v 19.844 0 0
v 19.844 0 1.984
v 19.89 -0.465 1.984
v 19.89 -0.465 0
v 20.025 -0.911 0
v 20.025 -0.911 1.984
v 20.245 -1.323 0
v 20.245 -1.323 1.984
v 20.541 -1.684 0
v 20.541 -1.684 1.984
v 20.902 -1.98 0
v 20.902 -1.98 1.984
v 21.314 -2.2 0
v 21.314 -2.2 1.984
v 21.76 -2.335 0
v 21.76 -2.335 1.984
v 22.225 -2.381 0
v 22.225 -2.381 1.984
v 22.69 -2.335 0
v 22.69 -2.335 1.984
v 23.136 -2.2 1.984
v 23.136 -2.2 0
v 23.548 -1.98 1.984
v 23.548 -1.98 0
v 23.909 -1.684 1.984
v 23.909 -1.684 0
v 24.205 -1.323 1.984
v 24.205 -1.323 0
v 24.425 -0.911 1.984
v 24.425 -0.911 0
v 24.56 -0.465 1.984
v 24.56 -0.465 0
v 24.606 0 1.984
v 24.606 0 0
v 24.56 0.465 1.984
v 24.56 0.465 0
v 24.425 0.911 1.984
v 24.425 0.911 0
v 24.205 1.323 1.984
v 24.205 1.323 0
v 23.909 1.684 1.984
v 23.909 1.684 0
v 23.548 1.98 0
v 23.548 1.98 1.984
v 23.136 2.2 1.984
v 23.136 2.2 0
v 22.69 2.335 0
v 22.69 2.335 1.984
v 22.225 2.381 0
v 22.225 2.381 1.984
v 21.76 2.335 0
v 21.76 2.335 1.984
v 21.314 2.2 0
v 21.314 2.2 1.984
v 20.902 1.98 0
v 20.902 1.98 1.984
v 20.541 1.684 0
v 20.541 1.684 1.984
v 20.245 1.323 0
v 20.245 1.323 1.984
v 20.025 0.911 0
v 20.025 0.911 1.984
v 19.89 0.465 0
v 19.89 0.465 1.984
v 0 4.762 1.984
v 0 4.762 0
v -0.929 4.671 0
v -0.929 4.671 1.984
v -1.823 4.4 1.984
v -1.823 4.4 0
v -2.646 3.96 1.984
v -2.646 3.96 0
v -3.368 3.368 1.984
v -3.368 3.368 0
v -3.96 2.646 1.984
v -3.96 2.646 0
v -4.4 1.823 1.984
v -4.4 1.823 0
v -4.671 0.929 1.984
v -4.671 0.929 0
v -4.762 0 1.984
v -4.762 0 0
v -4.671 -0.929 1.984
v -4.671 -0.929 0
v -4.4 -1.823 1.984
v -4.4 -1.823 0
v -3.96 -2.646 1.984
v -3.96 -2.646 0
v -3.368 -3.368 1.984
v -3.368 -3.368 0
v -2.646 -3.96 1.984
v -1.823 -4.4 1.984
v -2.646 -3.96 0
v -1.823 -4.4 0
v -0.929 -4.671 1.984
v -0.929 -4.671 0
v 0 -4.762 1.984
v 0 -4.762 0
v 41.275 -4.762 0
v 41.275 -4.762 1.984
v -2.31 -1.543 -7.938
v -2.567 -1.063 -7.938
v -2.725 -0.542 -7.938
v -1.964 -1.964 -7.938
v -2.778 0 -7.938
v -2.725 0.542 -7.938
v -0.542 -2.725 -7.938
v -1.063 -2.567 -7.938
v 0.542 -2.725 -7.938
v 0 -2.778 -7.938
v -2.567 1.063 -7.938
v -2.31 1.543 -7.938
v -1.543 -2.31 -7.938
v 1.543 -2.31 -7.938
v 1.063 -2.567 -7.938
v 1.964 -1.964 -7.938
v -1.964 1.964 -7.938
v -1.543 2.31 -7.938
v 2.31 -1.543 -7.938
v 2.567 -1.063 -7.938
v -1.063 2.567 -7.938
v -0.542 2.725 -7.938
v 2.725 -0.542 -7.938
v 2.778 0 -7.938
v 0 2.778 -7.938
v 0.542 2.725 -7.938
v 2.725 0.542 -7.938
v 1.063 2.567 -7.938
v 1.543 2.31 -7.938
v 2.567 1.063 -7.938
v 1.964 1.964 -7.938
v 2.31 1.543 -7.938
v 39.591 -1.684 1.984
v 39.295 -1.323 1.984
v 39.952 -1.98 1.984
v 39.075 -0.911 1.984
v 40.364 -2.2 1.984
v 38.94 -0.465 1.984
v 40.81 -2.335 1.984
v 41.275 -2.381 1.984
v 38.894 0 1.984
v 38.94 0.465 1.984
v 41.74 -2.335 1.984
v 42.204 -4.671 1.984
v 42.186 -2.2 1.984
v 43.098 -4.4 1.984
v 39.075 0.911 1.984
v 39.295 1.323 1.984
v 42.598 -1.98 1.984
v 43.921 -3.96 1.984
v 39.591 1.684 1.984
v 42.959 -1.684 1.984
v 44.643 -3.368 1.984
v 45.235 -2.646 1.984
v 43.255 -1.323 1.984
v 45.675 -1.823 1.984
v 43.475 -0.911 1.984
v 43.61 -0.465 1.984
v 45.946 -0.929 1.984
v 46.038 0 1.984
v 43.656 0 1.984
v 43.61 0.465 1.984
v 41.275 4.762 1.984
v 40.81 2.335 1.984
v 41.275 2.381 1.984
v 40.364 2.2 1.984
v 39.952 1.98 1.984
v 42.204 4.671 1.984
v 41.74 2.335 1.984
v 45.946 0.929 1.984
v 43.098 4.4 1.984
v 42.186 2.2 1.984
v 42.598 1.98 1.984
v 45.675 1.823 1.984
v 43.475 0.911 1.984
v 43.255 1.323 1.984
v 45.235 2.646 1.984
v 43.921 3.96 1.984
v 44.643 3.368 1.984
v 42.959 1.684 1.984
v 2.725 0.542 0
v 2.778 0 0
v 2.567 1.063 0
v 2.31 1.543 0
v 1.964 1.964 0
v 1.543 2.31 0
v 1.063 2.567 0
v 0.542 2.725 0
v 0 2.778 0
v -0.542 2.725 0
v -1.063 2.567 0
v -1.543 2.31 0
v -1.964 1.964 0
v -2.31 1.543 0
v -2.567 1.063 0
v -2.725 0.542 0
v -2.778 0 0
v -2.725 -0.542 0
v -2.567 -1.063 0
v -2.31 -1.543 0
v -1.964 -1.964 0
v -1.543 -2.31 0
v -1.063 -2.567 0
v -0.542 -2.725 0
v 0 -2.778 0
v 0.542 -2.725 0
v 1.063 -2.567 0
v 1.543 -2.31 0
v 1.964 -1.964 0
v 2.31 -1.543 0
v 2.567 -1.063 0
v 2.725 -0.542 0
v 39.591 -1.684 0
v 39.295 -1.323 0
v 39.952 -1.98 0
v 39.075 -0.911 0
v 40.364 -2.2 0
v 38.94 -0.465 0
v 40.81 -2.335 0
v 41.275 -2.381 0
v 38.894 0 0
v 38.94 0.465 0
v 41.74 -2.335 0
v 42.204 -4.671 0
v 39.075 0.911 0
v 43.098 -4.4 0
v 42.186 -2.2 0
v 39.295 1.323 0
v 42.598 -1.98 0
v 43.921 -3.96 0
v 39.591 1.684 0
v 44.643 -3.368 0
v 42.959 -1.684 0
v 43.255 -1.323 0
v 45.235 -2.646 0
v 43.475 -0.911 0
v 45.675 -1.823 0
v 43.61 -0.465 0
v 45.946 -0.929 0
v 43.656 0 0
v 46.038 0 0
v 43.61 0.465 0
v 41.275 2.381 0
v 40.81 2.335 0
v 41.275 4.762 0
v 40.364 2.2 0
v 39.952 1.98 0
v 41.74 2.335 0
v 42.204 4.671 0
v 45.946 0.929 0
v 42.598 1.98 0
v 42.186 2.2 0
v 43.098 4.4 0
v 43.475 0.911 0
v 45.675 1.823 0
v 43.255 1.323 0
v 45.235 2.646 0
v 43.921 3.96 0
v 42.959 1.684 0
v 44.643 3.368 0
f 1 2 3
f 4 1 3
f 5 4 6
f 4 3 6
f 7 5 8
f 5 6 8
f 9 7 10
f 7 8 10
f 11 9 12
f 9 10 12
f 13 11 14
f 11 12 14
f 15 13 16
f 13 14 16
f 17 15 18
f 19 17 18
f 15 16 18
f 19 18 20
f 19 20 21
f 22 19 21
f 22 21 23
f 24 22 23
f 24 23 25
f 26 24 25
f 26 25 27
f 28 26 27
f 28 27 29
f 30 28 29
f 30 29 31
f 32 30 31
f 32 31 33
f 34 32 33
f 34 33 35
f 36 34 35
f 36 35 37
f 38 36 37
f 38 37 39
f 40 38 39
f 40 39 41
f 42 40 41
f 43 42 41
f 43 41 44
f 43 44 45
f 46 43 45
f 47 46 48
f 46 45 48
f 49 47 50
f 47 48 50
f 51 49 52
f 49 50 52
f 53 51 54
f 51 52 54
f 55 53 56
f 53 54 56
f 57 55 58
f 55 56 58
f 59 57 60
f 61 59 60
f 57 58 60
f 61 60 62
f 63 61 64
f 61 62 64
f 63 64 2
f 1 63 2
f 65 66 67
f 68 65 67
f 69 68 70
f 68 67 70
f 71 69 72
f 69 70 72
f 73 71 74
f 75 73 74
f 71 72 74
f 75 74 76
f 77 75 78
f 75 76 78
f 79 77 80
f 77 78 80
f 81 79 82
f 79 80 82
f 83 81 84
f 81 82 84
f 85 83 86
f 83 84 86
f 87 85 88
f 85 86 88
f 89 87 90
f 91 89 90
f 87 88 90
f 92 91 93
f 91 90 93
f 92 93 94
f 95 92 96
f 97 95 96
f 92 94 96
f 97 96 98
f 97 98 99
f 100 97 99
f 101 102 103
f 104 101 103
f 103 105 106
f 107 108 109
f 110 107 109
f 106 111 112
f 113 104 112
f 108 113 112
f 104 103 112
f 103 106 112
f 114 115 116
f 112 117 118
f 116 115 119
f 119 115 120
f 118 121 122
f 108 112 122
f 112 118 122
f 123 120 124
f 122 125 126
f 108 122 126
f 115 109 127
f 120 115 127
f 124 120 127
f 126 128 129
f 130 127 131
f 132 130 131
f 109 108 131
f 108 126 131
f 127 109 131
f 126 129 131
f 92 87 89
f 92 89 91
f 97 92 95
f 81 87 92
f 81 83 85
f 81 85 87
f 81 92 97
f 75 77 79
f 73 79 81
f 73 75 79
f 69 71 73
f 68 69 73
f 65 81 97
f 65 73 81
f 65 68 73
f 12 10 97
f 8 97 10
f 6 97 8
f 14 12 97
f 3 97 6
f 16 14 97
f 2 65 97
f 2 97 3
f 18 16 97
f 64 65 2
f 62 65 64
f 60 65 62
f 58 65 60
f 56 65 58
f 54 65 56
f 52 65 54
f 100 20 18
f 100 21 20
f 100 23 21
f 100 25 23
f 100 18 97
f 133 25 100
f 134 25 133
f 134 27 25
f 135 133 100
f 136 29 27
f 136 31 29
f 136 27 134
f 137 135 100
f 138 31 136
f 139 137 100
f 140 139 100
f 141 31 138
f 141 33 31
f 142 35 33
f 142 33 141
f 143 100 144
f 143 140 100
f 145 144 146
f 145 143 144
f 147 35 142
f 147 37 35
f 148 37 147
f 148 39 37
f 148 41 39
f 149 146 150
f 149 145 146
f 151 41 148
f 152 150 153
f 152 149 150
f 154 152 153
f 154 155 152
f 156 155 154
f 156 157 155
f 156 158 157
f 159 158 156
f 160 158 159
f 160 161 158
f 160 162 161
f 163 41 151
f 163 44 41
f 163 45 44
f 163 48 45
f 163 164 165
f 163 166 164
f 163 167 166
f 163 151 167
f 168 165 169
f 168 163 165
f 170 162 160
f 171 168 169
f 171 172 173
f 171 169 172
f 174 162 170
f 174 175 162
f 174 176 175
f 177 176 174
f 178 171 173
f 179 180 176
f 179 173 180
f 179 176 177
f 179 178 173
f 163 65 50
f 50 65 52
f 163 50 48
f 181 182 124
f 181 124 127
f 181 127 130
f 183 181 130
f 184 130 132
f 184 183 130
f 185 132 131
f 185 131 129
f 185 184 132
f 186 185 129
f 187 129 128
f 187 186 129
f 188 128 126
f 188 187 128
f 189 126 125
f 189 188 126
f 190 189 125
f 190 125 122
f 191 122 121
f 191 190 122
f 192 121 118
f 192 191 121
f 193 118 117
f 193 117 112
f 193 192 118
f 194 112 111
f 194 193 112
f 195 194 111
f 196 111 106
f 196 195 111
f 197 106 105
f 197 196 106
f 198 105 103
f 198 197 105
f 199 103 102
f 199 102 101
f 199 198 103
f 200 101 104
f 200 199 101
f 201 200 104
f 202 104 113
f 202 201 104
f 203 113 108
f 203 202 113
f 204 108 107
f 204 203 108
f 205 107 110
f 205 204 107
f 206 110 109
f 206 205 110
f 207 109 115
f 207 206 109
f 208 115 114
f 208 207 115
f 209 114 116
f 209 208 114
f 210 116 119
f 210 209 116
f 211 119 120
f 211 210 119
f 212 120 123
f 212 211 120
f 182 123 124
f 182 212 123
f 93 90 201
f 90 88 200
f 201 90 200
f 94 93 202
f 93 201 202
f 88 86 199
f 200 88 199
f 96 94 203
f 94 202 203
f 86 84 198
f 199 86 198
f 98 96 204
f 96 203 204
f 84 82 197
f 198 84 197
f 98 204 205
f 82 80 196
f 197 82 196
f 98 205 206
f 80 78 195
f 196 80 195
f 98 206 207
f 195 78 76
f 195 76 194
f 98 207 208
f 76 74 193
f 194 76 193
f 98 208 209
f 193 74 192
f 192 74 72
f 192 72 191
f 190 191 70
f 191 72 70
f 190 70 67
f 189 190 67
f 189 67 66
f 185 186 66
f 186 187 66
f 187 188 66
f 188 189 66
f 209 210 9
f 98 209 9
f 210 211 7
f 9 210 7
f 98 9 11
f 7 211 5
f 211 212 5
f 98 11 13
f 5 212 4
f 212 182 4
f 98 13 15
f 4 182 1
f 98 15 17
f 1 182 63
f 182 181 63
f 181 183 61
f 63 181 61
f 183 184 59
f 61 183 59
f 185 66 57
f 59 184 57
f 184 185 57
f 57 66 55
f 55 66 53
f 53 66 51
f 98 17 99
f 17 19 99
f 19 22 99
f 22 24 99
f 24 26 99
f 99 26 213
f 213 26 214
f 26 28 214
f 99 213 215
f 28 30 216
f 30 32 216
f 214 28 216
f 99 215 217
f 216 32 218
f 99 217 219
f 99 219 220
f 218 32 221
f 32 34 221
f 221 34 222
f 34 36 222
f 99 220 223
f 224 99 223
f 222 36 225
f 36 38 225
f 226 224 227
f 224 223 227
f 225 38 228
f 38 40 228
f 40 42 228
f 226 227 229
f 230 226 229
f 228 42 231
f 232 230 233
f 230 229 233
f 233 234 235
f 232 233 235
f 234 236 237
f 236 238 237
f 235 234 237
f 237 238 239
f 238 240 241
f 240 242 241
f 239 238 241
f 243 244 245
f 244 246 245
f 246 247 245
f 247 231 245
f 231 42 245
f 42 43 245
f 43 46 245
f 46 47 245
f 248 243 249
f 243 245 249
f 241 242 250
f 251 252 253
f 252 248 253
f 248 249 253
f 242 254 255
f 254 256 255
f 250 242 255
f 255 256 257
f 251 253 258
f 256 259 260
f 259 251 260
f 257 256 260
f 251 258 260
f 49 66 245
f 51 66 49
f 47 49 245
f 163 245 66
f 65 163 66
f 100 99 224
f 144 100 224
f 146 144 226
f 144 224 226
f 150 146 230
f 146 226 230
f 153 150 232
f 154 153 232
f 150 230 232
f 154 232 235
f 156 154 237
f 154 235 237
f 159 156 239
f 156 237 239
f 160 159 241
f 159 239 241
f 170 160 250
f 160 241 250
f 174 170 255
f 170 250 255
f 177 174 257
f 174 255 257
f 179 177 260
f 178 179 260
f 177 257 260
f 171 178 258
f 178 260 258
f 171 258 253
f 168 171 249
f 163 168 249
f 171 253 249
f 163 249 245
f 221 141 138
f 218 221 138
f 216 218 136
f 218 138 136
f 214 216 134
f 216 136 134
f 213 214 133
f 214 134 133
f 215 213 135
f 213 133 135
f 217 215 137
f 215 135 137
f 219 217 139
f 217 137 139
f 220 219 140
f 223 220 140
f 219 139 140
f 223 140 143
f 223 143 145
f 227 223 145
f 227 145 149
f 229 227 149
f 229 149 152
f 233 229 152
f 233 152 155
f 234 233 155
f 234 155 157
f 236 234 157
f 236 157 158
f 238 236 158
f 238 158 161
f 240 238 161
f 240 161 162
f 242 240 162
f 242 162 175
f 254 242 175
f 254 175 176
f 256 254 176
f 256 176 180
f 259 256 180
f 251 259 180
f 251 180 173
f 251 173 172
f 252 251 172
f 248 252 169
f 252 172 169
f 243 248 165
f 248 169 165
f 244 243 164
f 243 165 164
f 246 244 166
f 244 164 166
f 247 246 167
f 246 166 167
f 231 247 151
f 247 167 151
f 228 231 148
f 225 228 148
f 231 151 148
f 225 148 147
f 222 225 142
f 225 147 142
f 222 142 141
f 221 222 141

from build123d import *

# Parameters (mm, degrees)
F0_R     = 2.778125
F1_DEPTH = 1.984375
F2_DEPTH = 7.9375
F3_D     = 4.7625
F3_DEPTH = 12.7


with BuildPart() as f1:
    # F0 (on Top) → F1 (new body)
    with BuildSketch(Plane.XY):
        with BuildLine():
            Line((41.275, 4.7625), (0, 4.7625))
            ThreePointArc((0, 4.7625), (-4.7625, 0), (0, -4.7625))
            Line((0, -4.7625), (41.275, -4.7625))
            ThreePointArc((41.275, -4.7625), (46.0375, 0), (41.275, 4.7625))
        make_face()
        Circle(F0_R, mode=Mode.SUBTRACT)
        Circle(F0_R)
    extrude(amount=F1_DEPTH)

    # F0 (on Top) → F2 (join)
    with BuildSketch(Plane.XY):
        Circle(F0_R)
    extrude(amount=-F2_DEPTH)

    # F3
    with Locations(Plane(origin=(0, 0, 0), x_dir=(1, 0, 0), z_dir=(0, 0, -1))):
        with Locations((22.225, 0), (41.275, 0)):
            Hole(F3_D / 2, depth=F3_DEPTH)


solid = f1.part
